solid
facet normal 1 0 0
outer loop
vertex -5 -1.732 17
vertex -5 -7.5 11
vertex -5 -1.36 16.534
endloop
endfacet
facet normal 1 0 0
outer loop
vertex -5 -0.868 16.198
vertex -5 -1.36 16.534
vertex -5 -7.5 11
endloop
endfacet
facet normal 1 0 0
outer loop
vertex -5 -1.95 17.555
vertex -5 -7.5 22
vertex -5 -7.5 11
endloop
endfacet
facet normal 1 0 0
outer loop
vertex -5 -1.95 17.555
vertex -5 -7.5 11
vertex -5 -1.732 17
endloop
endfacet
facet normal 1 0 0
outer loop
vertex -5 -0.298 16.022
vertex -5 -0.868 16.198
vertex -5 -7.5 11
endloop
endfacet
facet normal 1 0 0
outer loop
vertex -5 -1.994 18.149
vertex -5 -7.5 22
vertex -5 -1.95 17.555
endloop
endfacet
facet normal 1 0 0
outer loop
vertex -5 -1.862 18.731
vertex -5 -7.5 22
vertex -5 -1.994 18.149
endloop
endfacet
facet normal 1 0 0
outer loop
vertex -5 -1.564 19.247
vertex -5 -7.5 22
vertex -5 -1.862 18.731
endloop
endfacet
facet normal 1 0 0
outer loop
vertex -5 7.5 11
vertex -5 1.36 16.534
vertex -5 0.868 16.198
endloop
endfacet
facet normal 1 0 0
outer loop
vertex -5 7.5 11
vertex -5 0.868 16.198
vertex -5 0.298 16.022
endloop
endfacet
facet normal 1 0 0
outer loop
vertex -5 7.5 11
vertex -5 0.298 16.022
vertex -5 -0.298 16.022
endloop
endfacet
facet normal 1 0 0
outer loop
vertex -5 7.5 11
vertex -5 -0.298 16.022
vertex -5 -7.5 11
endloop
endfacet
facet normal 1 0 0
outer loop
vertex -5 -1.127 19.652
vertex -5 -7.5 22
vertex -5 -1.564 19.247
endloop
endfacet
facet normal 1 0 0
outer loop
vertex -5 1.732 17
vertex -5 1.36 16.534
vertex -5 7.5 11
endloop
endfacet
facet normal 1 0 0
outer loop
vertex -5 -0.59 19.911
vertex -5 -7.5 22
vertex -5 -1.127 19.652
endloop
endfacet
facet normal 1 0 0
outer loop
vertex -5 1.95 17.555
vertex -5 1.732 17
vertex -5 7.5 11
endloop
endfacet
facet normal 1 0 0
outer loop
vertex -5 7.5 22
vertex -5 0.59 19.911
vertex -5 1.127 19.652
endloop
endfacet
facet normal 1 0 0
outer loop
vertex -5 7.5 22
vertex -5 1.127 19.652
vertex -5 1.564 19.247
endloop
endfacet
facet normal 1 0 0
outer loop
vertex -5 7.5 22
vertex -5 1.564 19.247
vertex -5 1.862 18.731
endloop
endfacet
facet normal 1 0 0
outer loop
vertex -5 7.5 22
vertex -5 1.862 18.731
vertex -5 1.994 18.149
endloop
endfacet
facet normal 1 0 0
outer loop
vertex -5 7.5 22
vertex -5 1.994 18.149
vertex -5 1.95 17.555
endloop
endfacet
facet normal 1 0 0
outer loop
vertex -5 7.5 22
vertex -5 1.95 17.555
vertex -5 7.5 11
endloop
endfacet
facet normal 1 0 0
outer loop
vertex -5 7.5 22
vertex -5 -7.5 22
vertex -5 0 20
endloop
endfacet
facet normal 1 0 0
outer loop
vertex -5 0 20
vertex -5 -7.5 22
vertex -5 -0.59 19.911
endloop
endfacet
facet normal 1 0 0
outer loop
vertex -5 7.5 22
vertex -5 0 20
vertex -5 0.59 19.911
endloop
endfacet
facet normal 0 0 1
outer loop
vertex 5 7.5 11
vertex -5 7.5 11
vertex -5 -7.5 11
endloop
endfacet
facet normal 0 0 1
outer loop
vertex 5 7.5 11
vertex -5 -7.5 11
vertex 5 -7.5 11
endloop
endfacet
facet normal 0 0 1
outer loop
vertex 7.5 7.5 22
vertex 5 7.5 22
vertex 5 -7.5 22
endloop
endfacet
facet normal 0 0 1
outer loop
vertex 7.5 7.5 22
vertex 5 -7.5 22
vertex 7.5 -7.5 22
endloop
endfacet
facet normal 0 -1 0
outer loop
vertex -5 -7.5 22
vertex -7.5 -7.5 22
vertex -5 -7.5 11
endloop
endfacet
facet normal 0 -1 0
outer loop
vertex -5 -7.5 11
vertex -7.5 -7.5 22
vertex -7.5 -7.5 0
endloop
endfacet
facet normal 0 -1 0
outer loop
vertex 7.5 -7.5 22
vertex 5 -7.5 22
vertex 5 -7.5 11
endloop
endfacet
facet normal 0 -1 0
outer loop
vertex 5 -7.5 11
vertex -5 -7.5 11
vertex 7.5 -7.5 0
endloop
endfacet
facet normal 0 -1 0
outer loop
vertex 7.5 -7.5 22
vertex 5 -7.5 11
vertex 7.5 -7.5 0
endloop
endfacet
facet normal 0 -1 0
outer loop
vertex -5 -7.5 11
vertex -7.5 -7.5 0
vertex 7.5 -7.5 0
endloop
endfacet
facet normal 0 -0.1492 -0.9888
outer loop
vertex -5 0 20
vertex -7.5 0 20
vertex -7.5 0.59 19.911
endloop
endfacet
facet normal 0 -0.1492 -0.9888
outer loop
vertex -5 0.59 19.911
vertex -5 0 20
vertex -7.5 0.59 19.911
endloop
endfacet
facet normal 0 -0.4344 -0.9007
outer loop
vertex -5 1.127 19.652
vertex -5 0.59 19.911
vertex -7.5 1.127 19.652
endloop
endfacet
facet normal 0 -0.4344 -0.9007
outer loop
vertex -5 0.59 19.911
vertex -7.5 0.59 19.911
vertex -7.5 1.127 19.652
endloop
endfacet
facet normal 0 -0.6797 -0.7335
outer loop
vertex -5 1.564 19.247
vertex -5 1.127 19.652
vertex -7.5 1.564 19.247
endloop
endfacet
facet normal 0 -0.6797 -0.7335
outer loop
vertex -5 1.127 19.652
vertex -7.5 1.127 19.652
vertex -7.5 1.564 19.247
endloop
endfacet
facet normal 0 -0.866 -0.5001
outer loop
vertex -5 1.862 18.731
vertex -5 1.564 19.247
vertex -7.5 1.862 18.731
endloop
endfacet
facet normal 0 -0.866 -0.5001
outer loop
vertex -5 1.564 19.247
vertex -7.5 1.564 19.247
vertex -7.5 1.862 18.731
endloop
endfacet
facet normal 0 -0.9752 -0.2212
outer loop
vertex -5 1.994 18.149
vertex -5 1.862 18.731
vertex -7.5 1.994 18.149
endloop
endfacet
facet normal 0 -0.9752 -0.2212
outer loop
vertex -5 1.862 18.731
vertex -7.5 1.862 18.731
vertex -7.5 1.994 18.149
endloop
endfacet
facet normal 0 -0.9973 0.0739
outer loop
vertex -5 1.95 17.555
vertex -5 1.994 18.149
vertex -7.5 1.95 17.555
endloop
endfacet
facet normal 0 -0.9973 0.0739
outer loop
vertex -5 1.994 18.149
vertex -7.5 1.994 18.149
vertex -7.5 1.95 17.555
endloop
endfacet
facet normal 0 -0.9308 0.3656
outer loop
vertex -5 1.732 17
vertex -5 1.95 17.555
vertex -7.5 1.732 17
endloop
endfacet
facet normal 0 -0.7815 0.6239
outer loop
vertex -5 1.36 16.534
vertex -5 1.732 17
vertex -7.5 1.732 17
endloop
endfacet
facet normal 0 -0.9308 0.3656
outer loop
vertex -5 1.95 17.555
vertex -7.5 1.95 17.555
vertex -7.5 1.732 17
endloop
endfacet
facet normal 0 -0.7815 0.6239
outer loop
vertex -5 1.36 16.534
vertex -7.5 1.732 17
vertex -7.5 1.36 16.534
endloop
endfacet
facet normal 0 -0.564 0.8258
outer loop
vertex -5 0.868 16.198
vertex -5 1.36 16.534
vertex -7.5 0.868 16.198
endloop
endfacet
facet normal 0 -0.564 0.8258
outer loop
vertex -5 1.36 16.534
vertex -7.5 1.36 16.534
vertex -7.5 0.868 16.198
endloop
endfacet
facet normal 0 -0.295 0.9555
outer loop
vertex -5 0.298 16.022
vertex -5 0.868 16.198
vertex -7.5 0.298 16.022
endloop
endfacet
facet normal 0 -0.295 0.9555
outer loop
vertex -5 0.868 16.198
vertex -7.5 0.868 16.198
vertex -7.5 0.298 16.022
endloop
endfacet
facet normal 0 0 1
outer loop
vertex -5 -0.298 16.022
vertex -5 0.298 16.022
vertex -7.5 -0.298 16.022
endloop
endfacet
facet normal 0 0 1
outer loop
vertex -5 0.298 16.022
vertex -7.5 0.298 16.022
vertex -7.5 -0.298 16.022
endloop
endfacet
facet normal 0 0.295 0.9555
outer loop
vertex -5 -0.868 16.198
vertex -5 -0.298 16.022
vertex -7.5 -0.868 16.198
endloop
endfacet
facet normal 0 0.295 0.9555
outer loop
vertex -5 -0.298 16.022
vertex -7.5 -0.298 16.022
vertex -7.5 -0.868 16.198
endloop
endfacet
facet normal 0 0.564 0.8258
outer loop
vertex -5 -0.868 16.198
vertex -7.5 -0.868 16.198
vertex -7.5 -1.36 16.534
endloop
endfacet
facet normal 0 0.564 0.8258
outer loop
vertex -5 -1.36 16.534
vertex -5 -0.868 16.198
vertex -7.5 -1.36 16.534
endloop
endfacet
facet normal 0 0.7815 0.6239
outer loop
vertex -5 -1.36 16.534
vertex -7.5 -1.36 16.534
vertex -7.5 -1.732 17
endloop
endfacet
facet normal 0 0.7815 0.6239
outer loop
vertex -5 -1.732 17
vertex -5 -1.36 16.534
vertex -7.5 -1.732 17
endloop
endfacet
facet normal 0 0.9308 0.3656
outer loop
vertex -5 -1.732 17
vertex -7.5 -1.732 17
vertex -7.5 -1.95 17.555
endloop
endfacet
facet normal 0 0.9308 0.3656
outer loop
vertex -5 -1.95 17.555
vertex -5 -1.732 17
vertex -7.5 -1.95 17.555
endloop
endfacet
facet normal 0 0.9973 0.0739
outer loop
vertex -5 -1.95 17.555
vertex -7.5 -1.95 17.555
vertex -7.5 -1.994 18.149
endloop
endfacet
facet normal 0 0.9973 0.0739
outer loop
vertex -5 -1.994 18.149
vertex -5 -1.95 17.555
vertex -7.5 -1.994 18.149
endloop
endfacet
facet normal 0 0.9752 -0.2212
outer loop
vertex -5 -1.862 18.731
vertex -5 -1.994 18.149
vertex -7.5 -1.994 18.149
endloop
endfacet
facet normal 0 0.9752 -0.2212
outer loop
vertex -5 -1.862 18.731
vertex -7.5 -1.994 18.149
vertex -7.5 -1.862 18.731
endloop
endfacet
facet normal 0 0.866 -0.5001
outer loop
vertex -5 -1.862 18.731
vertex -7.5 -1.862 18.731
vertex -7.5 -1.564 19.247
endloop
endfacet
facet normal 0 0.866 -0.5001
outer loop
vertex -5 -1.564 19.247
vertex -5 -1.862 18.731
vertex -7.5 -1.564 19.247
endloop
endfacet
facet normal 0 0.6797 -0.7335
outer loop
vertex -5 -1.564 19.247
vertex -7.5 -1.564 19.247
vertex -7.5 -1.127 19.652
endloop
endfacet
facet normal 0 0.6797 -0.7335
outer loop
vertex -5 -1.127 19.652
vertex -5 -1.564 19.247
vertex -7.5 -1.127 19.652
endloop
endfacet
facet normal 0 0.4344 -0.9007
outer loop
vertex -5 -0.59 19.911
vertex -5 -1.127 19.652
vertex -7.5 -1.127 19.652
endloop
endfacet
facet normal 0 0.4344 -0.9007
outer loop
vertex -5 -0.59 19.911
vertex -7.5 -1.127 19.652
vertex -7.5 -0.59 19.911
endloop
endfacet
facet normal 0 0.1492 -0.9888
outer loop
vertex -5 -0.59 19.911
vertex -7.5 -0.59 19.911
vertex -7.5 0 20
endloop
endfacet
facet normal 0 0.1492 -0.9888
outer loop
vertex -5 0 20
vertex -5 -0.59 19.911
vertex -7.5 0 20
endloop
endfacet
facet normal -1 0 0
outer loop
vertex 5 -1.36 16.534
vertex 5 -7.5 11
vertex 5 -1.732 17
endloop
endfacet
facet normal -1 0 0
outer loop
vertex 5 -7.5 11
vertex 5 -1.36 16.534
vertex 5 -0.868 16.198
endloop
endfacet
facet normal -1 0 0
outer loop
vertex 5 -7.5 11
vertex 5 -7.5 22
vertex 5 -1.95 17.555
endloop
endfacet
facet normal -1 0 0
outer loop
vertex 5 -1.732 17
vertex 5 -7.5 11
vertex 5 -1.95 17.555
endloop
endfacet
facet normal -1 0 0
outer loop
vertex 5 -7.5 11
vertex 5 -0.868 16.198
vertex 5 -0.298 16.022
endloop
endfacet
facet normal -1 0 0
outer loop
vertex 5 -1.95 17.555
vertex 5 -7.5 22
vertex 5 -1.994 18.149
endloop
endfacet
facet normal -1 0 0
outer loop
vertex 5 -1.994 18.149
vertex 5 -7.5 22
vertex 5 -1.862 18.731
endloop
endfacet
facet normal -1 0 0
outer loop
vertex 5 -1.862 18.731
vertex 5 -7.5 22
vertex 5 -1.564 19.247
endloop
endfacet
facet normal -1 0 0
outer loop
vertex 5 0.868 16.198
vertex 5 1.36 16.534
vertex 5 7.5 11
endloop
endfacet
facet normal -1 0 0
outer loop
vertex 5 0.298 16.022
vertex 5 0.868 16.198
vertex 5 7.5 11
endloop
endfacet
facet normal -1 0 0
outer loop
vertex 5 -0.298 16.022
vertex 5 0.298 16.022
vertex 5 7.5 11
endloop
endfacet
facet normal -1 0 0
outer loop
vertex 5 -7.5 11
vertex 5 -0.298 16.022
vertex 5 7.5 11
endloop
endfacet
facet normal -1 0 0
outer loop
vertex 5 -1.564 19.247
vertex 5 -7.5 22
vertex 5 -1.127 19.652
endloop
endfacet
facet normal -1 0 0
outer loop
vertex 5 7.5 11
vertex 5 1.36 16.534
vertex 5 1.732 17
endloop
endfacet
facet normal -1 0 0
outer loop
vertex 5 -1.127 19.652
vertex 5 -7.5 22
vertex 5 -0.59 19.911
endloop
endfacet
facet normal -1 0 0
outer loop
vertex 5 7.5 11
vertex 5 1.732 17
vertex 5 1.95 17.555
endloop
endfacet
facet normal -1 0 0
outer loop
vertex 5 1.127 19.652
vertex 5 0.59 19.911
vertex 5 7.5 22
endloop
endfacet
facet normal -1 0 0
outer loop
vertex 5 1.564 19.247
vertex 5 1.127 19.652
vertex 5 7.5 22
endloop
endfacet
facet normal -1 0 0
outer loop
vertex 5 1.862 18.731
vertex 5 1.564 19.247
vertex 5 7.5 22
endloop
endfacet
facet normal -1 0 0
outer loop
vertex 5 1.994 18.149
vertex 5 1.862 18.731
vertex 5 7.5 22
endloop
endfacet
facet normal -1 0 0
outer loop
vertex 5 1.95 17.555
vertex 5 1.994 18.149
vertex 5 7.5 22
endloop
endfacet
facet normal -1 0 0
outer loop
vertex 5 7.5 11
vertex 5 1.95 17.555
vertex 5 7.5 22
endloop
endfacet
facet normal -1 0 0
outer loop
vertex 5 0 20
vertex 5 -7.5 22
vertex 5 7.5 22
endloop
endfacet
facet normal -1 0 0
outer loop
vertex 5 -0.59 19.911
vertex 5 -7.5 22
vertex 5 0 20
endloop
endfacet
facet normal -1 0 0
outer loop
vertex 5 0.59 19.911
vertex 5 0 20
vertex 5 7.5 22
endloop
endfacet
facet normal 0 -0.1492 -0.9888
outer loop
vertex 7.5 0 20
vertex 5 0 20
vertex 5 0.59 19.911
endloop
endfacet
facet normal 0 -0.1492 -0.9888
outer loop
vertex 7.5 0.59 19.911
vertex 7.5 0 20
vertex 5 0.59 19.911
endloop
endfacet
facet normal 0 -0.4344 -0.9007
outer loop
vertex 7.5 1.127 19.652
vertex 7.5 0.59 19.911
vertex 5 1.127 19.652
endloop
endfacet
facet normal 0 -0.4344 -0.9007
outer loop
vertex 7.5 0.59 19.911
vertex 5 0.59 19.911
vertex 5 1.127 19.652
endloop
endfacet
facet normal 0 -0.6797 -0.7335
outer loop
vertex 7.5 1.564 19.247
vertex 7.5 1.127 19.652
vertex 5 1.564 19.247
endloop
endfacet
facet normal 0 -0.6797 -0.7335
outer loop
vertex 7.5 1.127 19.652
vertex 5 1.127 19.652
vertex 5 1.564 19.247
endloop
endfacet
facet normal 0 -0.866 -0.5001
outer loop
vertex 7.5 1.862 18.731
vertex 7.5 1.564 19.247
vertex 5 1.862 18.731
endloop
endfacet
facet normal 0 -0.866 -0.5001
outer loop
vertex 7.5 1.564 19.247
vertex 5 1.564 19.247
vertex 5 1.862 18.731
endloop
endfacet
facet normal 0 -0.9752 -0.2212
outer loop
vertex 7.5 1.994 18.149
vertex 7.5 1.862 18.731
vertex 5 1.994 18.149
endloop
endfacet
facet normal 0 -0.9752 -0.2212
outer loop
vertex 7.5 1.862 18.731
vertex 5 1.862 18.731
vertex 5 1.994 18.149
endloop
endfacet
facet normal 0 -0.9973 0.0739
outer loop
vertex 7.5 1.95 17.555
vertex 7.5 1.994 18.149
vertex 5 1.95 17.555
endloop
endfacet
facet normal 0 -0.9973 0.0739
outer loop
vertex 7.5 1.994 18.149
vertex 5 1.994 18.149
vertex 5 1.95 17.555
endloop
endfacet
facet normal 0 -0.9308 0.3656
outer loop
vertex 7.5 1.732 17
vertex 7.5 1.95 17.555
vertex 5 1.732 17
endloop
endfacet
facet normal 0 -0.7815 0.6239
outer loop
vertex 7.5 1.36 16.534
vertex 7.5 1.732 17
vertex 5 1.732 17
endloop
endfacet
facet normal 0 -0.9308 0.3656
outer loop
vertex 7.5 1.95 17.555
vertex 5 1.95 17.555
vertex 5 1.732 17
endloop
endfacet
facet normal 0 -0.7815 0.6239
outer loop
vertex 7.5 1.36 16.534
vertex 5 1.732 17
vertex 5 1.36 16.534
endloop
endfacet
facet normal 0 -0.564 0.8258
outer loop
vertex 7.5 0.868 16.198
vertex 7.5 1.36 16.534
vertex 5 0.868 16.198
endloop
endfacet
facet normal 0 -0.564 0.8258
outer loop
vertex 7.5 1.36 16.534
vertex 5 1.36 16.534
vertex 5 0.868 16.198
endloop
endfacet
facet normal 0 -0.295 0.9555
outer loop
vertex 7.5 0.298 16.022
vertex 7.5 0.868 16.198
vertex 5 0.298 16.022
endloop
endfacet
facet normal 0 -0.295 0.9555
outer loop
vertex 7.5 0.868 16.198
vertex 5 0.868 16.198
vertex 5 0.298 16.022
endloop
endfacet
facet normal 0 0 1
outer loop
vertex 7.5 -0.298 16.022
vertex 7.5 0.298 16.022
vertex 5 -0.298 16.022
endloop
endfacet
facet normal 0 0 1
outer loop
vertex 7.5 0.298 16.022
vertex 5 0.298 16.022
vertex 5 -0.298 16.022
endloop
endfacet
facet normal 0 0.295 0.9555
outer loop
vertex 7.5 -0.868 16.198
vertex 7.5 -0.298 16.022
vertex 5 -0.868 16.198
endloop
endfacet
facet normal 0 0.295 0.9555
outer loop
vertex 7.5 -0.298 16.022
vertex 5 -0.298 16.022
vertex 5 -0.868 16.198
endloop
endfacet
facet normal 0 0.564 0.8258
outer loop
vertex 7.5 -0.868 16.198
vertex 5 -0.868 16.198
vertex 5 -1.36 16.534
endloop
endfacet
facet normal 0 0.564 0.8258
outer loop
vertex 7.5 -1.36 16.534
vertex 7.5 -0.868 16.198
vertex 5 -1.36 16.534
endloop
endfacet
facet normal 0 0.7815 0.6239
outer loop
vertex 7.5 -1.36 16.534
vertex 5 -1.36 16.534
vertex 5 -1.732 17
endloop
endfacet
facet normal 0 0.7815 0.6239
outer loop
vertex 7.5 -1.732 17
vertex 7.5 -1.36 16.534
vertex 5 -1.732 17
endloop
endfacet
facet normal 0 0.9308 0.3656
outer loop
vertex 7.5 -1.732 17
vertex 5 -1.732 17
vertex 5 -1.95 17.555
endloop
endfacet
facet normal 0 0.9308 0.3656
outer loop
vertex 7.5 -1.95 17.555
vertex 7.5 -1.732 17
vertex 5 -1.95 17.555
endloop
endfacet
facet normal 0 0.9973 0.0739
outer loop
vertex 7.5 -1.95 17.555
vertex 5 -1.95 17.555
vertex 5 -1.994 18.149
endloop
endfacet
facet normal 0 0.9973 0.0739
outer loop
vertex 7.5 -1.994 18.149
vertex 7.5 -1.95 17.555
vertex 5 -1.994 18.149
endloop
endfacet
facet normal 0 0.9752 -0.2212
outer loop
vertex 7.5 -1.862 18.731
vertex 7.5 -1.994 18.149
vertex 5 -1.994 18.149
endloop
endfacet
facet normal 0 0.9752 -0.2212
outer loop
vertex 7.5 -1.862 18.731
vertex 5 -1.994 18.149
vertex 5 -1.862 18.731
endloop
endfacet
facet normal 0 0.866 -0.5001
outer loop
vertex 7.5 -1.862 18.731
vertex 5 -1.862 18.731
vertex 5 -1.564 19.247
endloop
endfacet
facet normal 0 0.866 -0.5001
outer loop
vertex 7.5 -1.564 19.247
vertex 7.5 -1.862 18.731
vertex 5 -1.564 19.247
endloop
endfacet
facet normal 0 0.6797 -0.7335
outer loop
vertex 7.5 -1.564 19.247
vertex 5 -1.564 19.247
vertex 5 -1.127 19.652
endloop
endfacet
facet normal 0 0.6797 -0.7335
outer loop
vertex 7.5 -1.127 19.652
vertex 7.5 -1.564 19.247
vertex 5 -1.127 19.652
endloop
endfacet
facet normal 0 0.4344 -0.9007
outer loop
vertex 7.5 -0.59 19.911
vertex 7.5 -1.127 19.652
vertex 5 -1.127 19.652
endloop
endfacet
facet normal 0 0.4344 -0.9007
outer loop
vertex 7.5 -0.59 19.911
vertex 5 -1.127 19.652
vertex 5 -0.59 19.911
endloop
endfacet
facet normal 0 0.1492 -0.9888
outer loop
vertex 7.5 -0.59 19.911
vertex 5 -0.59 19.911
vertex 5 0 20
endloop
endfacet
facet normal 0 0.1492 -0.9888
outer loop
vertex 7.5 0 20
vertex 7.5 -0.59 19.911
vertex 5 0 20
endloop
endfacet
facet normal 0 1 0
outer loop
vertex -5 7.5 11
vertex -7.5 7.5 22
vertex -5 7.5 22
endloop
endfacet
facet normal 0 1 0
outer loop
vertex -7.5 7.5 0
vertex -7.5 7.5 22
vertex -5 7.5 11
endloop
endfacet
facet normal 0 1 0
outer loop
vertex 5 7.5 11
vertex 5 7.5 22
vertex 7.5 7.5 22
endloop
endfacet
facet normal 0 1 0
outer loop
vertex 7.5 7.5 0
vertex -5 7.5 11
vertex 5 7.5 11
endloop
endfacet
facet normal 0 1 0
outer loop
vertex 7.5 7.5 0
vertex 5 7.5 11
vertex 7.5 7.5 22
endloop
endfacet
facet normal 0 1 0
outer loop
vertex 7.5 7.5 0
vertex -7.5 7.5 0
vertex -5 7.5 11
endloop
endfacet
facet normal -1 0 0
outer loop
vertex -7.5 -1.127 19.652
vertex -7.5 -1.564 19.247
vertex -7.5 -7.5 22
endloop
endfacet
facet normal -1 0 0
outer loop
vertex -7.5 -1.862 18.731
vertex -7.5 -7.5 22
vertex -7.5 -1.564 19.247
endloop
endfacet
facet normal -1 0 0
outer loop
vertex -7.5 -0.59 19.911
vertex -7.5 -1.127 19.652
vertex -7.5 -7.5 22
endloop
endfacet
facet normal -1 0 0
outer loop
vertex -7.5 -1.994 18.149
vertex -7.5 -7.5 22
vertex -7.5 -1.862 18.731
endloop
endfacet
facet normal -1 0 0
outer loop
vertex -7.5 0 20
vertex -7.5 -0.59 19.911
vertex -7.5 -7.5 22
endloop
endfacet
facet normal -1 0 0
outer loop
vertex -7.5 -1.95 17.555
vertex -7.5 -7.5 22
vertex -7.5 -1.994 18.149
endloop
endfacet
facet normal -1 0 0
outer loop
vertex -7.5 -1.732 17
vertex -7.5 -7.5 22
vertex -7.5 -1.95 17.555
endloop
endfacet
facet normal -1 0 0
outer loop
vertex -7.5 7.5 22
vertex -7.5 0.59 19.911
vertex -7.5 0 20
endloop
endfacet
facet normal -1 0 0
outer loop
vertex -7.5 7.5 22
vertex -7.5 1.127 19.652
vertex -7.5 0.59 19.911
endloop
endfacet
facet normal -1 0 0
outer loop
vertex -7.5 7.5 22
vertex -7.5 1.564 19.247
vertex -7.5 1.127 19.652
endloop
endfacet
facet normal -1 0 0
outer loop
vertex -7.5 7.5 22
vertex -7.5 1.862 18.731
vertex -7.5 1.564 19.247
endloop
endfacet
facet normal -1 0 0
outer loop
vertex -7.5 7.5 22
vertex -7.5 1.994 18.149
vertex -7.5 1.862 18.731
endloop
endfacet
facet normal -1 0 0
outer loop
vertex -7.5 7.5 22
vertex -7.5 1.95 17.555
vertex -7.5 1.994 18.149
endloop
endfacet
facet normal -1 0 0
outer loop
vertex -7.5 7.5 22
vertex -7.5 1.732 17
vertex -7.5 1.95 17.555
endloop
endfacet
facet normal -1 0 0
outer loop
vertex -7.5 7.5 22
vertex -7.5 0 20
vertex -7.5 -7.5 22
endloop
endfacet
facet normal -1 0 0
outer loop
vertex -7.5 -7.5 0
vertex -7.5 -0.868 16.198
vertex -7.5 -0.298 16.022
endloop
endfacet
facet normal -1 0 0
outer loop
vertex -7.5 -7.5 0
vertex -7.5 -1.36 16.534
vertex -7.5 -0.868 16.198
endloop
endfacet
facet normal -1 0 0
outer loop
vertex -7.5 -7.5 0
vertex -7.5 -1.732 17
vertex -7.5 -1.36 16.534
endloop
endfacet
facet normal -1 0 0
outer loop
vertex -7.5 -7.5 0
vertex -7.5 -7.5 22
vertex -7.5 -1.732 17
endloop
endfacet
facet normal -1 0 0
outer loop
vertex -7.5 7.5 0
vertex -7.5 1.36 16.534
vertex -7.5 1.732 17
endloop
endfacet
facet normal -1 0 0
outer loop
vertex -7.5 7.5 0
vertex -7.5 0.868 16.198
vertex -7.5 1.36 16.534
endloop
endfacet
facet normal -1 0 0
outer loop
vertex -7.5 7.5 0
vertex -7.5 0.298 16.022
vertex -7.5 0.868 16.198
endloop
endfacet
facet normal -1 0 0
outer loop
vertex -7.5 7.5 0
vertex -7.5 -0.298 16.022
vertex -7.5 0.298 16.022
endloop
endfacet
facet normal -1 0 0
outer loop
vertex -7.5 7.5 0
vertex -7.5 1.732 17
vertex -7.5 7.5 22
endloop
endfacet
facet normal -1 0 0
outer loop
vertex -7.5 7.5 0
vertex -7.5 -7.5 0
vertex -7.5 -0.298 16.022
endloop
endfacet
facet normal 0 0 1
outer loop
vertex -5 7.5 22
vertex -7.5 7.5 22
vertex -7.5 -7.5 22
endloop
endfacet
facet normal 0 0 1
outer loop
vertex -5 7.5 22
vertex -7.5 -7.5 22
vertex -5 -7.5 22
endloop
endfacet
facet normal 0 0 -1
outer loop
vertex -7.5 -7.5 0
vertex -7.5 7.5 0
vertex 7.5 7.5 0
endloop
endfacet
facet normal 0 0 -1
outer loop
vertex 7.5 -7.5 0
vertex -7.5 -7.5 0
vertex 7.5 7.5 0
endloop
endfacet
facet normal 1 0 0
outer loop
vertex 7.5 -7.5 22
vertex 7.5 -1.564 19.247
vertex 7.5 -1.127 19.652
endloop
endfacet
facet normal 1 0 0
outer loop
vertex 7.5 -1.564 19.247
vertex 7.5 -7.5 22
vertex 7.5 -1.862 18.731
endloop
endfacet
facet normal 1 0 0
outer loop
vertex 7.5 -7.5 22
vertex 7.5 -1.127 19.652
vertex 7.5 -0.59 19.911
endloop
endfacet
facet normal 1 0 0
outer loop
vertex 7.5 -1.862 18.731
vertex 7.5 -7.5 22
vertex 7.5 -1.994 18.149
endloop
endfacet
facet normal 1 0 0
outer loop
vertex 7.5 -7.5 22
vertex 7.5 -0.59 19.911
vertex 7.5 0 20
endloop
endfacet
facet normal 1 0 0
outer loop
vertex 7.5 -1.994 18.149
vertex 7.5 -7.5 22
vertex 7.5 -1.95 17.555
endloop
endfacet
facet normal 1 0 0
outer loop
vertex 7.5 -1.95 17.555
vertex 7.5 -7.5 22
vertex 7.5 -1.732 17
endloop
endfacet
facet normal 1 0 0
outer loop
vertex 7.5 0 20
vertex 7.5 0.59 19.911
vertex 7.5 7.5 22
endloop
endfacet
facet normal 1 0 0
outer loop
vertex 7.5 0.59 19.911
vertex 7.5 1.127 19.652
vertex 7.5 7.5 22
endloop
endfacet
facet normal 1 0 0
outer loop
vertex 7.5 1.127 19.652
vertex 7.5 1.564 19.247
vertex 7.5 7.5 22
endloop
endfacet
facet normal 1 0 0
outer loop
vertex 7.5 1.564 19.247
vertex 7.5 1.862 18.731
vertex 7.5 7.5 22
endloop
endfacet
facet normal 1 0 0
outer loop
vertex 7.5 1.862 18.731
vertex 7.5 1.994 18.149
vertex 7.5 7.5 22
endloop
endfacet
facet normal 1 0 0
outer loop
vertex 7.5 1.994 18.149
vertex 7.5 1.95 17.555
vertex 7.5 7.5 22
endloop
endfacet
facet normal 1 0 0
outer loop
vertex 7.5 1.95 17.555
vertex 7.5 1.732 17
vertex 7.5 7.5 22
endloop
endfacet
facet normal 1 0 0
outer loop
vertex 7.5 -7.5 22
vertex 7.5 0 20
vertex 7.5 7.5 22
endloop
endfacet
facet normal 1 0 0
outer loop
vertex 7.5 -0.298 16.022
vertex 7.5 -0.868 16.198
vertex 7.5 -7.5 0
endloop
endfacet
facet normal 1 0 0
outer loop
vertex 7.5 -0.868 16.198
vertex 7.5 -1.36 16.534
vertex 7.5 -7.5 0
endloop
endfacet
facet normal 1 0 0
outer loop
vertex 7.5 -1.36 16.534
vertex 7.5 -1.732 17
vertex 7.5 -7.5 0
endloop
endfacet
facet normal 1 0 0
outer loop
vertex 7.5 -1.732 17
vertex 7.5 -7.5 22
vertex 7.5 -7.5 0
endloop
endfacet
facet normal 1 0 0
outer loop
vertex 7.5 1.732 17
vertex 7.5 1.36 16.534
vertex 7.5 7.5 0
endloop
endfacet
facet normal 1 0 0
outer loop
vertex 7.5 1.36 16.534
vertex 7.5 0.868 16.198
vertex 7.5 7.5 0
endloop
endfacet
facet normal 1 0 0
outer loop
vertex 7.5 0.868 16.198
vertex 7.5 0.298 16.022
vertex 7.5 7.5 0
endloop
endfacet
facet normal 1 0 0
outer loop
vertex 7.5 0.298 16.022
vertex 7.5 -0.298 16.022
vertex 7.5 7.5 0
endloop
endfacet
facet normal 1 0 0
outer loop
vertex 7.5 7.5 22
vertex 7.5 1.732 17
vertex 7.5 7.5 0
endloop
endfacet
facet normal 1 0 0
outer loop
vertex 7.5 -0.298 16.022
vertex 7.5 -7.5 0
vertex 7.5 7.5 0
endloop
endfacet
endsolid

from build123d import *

# Parameters (mm, degrees)
SKETCH2_W           = 15
SKETCH2_H           = 15
BOSS_EXTRUDE2_DEPTH = 22
SKETCH4_W           = 10
SKETCH4_H           = 15
CUT_EXTRUDE1_DEPTH  = 11
SKETCH5_R           = 2
CUT_EXTRUDE2_DEPTH  = 25


with BuildPart() as part:
    # Sketch2 → Boss-Extrude2 (new body)
    with BuildSketch(Plane.XY):
        Rectangle(SKETCH2_W, SKETCH2_H)
    extrude(amount=BOSS_EXTRUDE2_DEPTH)

    # Sketch4 → Cut-Extrude1 (cut)
    with BuildSketch(Plane.XY.offset(22)):
        Rectangle(SKETCH4_W, SKETCH4_H)
    extrude(amount=-CUT_EXTRUDE1_DEPTH, mode=Mode.SUBTRACT)

    # Sketch5 → Cut-Extrude2 (cut)
    with BuildSketch(Plane.ZY.offset(7.5)):
        with Locations((18, 0)):
            Circle(SKETCH5_R)
    extrude(amount=-CUT_EXTRUDE2_DEPTH, mode=Mode.SUBTRACT)


solid = part.part
